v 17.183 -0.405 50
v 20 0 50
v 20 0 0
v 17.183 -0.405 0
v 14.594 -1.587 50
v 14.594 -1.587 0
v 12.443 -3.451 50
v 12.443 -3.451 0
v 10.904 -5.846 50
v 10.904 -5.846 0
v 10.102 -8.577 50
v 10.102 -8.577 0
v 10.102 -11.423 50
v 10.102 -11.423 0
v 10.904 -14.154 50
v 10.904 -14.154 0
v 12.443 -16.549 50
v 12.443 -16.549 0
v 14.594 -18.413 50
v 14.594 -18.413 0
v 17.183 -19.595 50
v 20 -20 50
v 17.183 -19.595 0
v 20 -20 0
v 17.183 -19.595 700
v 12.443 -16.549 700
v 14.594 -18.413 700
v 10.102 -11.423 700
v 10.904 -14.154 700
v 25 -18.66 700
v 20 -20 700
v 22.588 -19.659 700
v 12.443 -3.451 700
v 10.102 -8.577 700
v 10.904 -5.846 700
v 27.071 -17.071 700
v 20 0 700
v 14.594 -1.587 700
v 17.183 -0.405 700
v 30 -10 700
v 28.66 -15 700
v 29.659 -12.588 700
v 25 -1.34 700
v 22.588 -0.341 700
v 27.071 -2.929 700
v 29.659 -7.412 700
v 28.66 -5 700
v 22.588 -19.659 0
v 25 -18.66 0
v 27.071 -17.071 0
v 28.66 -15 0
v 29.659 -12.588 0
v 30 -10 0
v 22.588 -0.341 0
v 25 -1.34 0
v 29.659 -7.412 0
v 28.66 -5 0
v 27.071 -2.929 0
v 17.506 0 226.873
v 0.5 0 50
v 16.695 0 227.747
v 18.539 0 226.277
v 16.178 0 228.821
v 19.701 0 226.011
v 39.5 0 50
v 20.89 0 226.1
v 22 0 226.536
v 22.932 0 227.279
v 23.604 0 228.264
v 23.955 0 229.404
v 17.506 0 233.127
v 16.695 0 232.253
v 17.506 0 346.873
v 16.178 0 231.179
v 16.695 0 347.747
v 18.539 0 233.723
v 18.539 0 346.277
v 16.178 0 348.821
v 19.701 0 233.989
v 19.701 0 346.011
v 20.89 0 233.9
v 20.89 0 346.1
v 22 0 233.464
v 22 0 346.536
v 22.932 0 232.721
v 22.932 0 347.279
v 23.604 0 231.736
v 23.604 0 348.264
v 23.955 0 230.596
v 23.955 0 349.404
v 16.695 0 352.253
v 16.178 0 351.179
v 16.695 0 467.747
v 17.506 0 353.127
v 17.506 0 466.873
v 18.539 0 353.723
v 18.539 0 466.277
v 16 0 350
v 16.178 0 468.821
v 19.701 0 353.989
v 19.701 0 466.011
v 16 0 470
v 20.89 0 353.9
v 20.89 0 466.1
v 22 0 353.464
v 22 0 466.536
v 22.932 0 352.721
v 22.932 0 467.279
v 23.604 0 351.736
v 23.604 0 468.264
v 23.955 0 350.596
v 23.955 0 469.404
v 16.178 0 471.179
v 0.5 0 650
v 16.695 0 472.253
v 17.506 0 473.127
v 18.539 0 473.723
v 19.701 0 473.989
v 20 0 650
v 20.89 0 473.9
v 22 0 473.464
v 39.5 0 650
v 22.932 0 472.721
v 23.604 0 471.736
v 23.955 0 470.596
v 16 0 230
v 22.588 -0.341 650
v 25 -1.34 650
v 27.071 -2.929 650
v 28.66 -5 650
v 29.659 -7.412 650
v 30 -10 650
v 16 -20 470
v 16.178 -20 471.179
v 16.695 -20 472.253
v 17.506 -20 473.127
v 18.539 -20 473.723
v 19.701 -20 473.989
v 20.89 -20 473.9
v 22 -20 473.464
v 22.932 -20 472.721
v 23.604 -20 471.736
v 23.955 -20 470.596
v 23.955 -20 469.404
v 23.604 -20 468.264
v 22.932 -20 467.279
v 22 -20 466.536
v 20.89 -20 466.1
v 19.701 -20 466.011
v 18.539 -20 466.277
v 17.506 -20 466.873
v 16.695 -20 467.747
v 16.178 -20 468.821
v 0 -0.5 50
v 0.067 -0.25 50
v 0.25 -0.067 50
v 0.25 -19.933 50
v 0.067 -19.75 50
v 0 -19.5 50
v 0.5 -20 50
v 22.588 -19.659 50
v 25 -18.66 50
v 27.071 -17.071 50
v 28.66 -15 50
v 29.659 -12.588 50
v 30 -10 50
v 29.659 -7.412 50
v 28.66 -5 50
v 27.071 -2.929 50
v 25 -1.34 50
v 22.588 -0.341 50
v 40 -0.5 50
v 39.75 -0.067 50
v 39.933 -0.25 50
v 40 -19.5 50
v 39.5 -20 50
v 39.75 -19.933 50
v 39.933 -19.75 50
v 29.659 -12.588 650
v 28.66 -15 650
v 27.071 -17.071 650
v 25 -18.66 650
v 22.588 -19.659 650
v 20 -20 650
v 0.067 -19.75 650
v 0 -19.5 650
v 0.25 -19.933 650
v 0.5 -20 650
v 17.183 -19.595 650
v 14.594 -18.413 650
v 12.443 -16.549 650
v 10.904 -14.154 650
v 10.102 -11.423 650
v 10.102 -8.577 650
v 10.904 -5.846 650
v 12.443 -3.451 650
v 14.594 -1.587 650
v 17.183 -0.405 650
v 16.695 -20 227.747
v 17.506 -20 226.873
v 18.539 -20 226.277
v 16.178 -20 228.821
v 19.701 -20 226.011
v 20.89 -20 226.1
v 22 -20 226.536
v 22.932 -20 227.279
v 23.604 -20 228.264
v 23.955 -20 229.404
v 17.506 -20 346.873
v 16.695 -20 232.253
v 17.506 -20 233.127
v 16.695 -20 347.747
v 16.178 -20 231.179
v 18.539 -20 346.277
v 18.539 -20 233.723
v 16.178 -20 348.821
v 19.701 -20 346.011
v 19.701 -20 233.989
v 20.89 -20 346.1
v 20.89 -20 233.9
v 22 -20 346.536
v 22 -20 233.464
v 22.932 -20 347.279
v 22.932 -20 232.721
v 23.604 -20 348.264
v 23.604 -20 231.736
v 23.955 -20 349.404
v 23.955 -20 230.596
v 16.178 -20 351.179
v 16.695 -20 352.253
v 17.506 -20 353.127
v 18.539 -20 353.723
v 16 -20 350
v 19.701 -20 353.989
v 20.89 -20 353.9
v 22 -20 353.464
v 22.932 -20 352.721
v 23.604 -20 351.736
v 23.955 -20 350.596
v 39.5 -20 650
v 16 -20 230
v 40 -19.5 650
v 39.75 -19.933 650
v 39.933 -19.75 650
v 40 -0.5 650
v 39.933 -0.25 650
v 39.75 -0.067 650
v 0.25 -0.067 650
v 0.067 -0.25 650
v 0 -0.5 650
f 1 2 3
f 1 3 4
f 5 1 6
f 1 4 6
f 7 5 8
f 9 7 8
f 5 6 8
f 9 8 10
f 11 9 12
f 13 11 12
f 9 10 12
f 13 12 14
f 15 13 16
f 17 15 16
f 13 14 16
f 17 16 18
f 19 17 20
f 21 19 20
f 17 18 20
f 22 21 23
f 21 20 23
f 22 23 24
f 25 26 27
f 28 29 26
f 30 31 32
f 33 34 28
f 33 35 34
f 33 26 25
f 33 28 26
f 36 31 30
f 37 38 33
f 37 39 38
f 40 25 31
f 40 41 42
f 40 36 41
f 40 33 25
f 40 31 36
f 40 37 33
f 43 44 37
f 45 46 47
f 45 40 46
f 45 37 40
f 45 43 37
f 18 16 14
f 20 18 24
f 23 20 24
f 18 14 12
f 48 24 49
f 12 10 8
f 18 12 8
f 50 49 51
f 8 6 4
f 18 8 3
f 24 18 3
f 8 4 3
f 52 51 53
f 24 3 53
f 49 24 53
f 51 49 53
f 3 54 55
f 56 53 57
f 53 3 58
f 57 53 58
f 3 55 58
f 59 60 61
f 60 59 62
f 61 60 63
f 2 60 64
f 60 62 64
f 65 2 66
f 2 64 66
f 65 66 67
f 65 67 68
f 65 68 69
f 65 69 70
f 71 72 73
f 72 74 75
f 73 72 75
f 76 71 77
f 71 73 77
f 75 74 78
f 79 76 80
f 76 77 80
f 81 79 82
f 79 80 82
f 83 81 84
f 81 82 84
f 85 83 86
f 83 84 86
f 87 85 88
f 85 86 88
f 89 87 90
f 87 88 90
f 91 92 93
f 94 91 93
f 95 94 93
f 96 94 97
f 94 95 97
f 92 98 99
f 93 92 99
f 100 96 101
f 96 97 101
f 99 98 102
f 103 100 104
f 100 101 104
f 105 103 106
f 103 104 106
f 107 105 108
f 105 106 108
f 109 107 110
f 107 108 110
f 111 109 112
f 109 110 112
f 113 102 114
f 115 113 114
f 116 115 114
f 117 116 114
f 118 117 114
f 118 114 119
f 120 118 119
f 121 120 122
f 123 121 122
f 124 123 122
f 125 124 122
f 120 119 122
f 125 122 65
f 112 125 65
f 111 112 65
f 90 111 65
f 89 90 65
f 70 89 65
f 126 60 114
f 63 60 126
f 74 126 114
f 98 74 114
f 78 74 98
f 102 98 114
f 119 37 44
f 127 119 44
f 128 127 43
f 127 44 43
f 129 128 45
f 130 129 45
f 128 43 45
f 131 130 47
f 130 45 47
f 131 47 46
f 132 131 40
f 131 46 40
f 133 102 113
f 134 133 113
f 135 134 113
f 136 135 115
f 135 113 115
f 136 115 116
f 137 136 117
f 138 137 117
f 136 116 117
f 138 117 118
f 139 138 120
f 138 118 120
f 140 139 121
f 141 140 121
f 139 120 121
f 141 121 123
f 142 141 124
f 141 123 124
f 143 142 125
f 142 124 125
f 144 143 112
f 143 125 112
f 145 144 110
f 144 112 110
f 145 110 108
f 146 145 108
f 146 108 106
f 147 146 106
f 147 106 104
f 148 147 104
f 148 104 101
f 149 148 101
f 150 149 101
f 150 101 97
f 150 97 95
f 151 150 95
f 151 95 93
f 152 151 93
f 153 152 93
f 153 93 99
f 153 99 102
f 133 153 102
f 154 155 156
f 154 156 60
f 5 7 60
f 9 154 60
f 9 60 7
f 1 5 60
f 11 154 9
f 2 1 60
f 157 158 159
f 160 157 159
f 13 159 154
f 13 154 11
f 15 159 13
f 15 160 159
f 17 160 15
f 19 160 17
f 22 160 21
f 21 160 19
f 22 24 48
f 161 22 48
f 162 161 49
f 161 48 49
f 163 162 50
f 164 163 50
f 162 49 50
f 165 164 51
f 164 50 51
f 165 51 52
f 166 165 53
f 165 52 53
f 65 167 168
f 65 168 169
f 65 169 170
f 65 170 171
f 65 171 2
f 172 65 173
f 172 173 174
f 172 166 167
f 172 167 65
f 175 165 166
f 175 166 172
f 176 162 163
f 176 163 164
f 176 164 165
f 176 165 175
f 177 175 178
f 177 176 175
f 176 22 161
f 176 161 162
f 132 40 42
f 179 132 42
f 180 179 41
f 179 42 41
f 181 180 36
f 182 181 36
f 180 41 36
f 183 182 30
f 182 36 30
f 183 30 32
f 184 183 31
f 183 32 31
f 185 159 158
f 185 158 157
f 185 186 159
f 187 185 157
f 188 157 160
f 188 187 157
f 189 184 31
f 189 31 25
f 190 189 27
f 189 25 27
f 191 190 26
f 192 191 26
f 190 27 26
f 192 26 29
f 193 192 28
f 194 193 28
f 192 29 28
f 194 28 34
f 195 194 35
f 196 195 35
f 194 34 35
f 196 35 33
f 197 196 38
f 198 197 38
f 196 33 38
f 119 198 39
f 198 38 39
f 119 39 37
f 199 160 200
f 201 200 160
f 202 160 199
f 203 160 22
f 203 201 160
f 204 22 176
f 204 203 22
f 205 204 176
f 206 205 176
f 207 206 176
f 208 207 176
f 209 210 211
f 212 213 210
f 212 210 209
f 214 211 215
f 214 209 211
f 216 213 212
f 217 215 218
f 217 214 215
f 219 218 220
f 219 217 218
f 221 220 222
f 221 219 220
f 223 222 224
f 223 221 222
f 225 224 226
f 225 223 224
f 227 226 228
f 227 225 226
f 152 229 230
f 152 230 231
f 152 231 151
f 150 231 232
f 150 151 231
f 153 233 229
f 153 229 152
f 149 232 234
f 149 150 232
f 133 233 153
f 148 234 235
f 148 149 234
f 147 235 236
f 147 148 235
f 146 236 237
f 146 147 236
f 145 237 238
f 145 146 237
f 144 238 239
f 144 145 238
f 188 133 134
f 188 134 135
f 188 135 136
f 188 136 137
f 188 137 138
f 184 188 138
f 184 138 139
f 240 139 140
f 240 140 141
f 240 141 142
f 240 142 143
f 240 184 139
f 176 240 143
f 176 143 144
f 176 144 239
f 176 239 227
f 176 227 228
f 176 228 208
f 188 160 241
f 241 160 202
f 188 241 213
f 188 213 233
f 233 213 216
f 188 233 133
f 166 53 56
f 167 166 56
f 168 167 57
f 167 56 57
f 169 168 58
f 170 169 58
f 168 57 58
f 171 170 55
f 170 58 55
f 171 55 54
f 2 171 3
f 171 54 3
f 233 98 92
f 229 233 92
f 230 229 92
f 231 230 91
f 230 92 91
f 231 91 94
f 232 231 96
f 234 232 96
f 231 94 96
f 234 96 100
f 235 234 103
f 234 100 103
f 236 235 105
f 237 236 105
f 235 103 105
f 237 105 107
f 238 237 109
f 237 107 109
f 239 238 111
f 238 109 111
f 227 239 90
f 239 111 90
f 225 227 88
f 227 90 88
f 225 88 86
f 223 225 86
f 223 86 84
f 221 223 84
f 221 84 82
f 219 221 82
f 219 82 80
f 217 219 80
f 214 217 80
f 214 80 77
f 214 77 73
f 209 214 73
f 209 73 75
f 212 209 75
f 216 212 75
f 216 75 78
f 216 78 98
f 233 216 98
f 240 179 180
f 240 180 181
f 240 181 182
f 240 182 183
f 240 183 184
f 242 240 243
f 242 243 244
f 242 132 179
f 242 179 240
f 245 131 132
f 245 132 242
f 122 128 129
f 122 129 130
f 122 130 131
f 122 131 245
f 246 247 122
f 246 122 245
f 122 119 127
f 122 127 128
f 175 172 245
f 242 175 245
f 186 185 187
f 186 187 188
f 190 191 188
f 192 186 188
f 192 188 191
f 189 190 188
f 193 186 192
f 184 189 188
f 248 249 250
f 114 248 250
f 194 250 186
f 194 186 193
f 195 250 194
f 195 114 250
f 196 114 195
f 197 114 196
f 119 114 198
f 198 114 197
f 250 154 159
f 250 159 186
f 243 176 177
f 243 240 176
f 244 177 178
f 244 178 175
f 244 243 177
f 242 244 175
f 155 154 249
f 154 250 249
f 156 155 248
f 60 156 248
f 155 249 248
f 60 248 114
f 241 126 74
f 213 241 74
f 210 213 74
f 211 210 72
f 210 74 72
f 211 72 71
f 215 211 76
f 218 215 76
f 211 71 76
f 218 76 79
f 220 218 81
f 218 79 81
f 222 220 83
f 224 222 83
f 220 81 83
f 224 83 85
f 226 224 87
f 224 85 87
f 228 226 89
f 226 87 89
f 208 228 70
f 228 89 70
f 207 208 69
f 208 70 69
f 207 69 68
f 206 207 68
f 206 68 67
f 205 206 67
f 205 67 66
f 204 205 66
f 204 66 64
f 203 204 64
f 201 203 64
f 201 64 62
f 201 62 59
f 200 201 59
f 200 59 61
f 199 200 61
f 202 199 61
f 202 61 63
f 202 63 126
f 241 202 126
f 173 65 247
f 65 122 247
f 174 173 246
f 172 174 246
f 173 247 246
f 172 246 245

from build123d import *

# Parameters (mm, degrees)
F0_W     = 40
F0_H     = 700
F1_DEPTH = 20
F3_DEPTH = 50
F5_DEPTH = 50
F6_R     = 4
F7_DEPTH = 25
F8_R     = 0.5


with BuildPart() as f1:
    # F0 (on Front) → F1 (new body)
    with BuildSketch(Plane.XZ):
        with Locations((20, 350)):
            Rectangle(F0_W, F0_H)
    extrude(amount=F1_DEPTH)

    # F2 (on face) → F3 (cut)
    with BuildSketch(Plane.XY.offset(700)):
        with BuildLine():
            ThreePointArc((20, 0), (27.071068, -2.928932), (30, -10))
            ThreePointArc((30, -10), (27.071068, -17.071068), (20, -20))
            Line((20, -20), (40, -20))
            Line((40, -20), (40, 0))
            Line((40, 0), (20, 0))
        make_face()
        with BuildLine():
            ThreePointArc((20, -20), (10, -10), (20, 0))
            Line((20, 0), (0, 0))
            Line((0, 0), (0, -20))
            Line((0, -20), (20, -20))
        make_face()
    extrude(amount=-F3_DEPTH, mode=Mode.SUBTRACT)

    # F4 (on face) → F5 (cut)
    with BuildSketch(Plane(origin=(0, 0, 0), x_dir=(1, 0, 0), z_dir=(0, 0, -1))):
        with BuildLine():
            ThreePointArc((20, 0), (10, 10), (20, 20))
            Line((20, 20), (0, 20))
            Line((0, 20), (0, 0))
            Line((0, 0), (20, 0))
        make_face()
        with BuildLine():
            ThreePointArc((20, 20), (27.071068, 17.071068), (30, 10))
            ThreePointArc((30, 10), (27.071068, 2.928932), (20, 0))
            Line((20, 0), (40, 0))
            Line((40, 0), (40, 20))
            Line((40, 20), (20, 20))
        make_face()
    extrude(amount=-F5_DEPTH, mode=Mode.SUBTRACT)

    # F6 (on face) → F7 (cut)
    with BuildSketch(Plane(origin=(0, 0, 0), x_dir=(-1, 0, 0), z_dir=(0, 1, 0))):
        with Locations((-20, 470)):
            Circle(F6_R)
        with Locations((-20, 230)):
            Circle(F6_R)
        with Locations((-20, 350)):
            Circle(F6_R)
    extrude(amount=-F7_DEPTH, mode=Mode.SUBTRACT)

    # F8
    f8_edges = [f1.edges().sort_by_distance(p)[0] for p in [
        (0, 0, 350),
        (0, -20, 350),
        (40, 0, 350),
        (40, -20, 350),
    ]]
    fillet(f8_edges, radius=F8_R)


solid = f1.part
